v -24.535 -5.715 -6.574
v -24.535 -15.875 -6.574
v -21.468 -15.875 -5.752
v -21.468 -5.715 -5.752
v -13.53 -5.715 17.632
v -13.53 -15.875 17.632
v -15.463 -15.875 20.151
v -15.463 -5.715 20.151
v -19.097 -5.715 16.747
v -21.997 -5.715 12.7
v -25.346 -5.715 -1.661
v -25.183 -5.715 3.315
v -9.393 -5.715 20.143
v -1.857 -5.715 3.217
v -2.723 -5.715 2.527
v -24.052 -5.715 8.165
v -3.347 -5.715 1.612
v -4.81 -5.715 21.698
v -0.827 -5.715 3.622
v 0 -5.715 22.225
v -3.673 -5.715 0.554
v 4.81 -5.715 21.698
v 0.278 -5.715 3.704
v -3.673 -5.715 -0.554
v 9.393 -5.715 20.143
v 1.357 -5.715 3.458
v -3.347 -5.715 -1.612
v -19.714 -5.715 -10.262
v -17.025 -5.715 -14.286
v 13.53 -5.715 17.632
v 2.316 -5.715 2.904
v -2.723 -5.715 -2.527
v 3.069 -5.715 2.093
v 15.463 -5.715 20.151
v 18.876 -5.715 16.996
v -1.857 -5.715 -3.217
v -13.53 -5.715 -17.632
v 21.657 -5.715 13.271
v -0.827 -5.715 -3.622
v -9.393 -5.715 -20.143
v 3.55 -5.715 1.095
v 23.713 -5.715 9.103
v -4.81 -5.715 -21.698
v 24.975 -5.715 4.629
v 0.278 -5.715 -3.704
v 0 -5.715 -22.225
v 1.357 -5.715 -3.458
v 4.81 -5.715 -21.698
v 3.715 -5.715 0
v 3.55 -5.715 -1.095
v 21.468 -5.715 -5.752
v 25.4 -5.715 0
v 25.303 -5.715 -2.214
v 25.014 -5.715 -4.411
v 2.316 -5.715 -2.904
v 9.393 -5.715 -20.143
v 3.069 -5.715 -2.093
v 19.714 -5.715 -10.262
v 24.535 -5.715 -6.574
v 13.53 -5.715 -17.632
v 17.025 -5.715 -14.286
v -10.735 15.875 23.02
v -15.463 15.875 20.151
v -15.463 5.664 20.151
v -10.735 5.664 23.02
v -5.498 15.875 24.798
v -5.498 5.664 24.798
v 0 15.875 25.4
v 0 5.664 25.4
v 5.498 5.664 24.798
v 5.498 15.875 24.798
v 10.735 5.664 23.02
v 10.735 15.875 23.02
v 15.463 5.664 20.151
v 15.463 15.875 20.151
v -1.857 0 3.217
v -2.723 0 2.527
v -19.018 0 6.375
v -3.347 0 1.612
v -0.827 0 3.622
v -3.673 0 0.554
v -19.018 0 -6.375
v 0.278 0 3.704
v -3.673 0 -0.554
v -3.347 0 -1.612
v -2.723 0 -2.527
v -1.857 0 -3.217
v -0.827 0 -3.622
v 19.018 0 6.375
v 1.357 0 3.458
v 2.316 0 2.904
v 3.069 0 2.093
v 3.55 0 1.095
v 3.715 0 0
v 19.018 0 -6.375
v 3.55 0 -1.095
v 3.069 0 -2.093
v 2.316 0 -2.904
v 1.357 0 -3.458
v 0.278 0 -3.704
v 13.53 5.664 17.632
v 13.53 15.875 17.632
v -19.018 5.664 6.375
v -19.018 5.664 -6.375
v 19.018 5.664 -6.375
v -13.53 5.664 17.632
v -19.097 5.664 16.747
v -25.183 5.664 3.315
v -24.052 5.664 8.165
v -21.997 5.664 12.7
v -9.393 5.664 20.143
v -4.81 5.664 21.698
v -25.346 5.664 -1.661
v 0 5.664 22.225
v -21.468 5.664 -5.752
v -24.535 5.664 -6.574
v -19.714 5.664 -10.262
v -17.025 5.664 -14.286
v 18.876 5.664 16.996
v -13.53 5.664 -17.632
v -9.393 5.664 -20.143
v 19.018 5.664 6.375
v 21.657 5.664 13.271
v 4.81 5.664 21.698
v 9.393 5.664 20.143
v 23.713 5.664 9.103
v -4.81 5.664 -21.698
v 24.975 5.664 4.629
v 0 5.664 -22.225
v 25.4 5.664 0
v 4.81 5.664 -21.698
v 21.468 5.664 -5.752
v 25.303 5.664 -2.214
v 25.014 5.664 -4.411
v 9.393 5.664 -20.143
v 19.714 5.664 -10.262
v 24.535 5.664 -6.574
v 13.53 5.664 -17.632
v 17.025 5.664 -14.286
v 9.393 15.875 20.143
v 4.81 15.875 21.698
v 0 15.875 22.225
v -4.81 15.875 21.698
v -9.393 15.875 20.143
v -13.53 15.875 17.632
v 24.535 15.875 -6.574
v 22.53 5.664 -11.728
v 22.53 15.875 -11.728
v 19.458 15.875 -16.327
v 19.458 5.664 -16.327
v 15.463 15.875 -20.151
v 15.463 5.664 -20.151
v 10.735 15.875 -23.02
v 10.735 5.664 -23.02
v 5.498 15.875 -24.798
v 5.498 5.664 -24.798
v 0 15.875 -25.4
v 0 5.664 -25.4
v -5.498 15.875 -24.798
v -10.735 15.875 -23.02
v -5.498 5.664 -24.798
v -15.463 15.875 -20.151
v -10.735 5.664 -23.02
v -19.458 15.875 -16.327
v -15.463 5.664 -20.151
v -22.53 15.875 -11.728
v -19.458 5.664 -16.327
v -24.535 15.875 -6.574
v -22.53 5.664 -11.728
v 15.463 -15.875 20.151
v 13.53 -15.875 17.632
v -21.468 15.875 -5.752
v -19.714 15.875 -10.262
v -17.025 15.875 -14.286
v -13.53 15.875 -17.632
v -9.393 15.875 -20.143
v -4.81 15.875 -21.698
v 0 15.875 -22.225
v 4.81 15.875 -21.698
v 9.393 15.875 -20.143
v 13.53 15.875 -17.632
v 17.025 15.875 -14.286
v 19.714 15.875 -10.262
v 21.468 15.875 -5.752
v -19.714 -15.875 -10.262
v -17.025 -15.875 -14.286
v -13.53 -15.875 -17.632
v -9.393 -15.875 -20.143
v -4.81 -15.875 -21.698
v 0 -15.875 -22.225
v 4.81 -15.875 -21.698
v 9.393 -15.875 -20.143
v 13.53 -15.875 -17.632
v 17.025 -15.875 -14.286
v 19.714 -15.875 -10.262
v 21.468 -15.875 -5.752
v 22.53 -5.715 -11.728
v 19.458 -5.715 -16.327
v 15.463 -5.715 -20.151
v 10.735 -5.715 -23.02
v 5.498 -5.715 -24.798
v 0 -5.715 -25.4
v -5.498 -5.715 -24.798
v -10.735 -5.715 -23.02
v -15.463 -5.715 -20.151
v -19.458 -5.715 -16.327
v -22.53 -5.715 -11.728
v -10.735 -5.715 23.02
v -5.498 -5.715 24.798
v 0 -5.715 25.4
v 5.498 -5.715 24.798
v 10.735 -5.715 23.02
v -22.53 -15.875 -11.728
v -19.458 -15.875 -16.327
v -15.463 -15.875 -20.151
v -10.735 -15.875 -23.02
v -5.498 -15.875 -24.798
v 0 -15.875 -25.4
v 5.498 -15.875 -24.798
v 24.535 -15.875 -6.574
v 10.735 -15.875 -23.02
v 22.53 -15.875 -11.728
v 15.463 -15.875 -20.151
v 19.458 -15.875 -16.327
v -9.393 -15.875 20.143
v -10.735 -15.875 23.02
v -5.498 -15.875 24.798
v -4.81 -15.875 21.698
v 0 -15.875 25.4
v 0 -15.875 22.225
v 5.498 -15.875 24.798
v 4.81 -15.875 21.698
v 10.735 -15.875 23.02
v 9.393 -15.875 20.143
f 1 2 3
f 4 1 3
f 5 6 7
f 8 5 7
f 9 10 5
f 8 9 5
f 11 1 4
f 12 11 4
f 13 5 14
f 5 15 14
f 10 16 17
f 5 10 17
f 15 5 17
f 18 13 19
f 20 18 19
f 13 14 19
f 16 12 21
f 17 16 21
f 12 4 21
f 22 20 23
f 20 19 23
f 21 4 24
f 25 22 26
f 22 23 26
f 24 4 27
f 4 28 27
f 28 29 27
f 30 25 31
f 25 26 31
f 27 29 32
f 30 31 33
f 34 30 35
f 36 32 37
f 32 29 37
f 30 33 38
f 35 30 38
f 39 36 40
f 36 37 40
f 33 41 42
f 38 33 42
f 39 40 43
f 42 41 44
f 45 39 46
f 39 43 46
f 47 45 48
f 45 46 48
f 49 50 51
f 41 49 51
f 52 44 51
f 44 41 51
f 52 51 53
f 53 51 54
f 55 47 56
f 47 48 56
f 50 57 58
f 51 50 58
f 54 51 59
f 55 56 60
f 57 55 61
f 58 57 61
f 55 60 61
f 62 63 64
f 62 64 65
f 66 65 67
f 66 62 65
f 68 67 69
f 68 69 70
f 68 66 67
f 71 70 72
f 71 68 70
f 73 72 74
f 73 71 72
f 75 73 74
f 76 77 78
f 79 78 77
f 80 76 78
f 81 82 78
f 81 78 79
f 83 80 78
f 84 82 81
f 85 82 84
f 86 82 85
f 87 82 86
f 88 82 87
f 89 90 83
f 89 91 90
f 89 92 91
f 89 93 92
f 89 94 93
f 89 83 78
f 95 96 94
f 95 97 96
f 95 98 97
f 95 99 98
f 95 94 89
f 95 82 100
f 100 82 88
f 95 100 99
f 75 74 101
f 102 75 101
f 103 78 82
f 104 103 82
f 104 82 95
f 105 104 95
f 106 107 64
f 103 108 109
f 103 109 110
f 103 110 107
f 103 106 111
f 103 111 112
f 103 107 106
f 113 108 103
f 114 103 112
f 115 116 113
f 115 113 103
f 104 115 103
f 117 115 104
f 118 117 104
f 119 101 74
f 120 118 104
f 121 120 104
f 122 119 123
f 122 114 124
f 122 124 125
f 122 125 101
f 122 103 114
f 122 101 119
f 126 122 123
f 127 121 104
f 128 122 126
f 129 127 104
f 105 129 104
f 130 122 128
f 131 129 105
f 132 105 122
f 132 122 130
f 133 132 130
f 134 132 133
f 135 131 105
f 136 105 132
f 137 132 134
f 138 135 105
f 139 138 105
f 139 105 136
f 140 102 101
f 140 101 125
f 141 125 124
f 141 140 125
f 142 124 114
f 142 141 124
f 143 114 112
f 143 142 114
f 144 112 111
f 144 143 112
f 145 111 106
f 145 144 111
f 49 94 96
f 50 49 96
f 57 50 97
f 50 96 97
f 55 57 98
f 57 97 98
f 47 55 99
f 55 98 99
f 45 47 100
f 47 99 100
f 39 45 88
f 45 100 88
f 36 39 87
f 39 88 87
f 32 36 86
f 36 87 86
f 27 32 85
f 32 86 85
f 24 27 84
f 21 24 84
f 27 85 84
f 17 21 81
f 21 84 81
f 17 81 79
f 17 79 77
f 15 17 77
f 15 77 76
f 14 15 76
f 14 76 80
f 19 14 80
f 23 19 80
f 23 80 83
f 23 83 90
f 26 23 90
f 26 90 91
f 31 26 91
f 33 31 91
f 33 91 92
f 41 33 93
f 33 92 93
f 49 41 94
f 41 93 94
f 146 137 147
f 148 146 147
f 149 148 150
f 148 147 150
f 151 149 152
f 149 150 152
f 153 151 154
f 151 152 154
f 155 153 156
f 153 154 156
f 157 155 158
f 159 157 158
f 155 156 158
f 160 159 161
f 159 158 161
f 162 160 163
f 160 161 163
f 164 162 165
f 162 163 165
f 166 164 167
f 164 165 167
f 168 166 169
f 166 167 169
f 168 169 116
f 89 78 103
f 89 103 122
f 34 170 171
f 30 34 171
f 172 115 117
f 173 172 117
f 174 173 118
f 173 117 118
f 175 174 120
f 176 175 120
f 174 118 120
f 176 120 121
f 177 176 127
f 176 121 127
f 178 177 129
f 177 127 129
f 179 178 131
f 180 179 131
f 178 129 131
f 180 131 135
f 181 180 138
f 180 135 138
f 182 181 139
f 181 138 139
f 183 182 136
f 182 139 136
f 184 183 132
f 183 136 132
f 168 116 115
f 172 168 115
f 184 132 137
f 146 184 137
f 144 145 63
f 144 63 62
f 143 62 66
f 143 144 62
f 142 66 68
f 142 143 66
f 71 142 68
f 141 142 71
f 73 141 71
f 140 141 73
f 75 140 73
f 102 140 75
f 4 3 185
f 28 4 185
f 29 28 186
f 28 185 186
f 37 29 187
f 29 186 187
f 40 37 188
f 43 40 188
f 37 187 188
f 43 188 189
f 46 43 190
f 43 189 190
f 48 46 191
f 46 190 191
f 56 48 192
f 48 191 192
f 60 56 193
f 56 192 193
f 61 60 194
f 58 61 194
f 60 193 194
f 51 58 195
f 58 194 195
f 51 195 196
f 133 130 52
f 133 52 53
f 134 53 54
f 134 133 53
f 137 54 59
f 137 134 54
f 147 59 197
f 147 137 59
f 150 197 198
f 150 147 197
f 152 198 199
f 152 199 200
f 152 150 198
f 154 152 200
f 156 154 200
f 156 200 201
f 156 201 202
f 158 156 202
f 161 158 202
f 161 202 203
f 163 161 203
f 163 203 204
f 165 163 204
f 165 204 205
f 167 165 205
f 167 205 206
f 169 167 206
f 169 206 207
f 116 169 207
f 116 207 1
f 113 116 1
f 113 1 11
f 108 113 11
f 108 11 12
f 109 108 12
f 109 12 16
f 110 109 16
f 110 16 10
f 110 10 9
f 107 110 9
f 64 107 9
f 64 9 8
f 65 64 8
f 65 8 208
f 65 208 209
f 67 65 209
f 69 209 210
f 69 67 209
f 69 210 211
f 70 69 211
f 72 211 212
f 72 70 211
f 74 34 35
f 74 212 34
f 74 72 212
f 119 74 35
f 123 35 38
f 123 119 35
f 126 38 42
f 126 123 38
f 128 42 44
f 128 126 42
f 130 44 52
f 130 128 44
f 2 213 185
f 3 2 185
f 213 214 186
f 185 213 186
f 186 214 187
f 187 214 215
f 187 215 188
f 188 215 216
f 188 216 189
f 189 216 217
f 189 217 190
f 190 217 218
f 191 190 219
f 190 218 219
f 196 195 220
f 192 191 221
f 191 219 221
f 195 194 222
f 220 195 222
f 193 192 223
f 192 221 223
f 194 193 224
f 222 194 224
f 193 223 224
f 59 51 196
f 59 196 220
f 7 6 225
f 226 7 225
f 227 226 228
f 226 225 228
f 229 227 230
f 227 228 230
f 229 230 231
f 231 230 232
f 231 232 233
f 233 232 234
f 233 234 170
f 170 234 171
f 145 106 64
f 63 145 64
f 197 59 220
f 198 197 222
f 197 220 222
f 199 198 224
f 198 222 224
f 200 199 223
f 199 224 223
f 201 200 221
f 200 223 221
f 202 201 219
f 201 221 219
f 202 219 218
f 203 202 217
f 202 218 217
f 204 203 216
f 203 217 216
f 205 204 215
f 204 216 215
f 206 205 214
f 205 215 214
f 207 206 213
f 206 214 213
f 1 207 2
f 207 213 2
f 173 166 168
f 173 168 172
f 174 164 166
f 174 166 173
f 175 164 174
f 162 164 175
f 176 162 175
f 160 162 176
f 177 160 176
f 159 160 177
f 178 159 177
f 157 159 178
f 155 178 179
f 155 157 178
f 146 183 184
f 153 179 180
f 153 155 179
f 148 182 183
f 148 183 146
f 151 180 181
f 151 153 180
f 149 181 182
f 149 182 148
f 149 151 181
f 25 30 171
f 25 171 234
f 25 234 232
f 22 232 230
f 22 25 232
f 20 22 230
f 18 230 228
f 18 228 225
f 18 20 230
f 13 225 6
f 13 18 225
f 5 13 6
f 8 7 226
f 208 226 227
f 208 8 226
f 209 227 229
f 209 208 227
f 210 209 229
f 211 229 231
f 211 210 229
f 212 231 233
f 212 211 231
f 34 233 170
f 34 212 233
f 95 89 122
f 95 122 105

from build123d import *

# Parameters (mm, degrees)
SKETCH1_R           = 25.4
SKETCH1_W           = 38.0365
SKETCH1_H           = 12.7508
BOSS_EXTRUDE1_DEPTH = 5.6642
BOSS_EXTRUDE2_START = -5.715
SKETCH1_3_R         = 25.4
SKETCH1_3_R_2       = 3.71475
BOSS_EXTRUDE2_DEPTH = 5.715
BOSS_EXTRUDE3_DEPTH = 15.875


with BuildPart() as part:
    # Sketch1 → Boss-Extrude1 (new body)
    with BuildSketch(Plane(origin=(0, 0, 0), x_dir=(1, 0, 0), z_dir=(0, 1, 0))):
        Circle(SKETCH1_R)
        Rectangle(SKETCH1_W, SKETCH1_H, mode=Mode.SUBTRACT)
    extrude(amount=BOSS_EXTRUDE1_DEPTH)

    # Sketch1<3> → Boss-Extrude2 (add)
    with BuildSketch(Plane(origin=(0, 0, 0), x_dir=(1, 0, 0), z_dir=(0, 1, 0)).offset(BOSS_EXTRUDE2_START)):
        Circle(SKETCH1_3_R)
        Circle(SKETCH1_3_R_2, mode=Mode.SUBTRACT)
    extrude(amount=BOSS_EXTRUDE2_DEPTH)

    # Sketch2 → Boss-Extrude3 (add, symmetric)
    with BuildSketch(Plane(origin=(0, 0, 0), x_dir=(1, 0, 0), z_dir=(0, 1, 0))):
        with BuildLine():
            Line((21.467701, 5.752253), (24.534516, 6.574004))
            ThreePointArc((24.534516, 6.574004), (0, 25.4), (-24.534516, 6.574004))
            Line((-24.534516, 6.574004), (-21.467701, 5.752253))
            ThreePointArc((-21.467701, 5.752253), (0, 22.225), (21.467701, 5.752253))
        make_face()
        with BuildLine():
            Line((-13.529723, -17.632278), (-15.46254, -20.151175))
            ThreePointArc((-15.46254, -20.151175), (0, -25.4), (15.46254, -20.151175))
            Line((15.46254, -20.151175), (13.529723, -17.632278))
            ThreePointArc((13.529723, -17.632278), (0, -22.225), (-13.529723, -17.632278))
        make_face()
    extrude(amount=BOSS_EXTRUDE3_DEPTH, both=True)


solid = part.part
